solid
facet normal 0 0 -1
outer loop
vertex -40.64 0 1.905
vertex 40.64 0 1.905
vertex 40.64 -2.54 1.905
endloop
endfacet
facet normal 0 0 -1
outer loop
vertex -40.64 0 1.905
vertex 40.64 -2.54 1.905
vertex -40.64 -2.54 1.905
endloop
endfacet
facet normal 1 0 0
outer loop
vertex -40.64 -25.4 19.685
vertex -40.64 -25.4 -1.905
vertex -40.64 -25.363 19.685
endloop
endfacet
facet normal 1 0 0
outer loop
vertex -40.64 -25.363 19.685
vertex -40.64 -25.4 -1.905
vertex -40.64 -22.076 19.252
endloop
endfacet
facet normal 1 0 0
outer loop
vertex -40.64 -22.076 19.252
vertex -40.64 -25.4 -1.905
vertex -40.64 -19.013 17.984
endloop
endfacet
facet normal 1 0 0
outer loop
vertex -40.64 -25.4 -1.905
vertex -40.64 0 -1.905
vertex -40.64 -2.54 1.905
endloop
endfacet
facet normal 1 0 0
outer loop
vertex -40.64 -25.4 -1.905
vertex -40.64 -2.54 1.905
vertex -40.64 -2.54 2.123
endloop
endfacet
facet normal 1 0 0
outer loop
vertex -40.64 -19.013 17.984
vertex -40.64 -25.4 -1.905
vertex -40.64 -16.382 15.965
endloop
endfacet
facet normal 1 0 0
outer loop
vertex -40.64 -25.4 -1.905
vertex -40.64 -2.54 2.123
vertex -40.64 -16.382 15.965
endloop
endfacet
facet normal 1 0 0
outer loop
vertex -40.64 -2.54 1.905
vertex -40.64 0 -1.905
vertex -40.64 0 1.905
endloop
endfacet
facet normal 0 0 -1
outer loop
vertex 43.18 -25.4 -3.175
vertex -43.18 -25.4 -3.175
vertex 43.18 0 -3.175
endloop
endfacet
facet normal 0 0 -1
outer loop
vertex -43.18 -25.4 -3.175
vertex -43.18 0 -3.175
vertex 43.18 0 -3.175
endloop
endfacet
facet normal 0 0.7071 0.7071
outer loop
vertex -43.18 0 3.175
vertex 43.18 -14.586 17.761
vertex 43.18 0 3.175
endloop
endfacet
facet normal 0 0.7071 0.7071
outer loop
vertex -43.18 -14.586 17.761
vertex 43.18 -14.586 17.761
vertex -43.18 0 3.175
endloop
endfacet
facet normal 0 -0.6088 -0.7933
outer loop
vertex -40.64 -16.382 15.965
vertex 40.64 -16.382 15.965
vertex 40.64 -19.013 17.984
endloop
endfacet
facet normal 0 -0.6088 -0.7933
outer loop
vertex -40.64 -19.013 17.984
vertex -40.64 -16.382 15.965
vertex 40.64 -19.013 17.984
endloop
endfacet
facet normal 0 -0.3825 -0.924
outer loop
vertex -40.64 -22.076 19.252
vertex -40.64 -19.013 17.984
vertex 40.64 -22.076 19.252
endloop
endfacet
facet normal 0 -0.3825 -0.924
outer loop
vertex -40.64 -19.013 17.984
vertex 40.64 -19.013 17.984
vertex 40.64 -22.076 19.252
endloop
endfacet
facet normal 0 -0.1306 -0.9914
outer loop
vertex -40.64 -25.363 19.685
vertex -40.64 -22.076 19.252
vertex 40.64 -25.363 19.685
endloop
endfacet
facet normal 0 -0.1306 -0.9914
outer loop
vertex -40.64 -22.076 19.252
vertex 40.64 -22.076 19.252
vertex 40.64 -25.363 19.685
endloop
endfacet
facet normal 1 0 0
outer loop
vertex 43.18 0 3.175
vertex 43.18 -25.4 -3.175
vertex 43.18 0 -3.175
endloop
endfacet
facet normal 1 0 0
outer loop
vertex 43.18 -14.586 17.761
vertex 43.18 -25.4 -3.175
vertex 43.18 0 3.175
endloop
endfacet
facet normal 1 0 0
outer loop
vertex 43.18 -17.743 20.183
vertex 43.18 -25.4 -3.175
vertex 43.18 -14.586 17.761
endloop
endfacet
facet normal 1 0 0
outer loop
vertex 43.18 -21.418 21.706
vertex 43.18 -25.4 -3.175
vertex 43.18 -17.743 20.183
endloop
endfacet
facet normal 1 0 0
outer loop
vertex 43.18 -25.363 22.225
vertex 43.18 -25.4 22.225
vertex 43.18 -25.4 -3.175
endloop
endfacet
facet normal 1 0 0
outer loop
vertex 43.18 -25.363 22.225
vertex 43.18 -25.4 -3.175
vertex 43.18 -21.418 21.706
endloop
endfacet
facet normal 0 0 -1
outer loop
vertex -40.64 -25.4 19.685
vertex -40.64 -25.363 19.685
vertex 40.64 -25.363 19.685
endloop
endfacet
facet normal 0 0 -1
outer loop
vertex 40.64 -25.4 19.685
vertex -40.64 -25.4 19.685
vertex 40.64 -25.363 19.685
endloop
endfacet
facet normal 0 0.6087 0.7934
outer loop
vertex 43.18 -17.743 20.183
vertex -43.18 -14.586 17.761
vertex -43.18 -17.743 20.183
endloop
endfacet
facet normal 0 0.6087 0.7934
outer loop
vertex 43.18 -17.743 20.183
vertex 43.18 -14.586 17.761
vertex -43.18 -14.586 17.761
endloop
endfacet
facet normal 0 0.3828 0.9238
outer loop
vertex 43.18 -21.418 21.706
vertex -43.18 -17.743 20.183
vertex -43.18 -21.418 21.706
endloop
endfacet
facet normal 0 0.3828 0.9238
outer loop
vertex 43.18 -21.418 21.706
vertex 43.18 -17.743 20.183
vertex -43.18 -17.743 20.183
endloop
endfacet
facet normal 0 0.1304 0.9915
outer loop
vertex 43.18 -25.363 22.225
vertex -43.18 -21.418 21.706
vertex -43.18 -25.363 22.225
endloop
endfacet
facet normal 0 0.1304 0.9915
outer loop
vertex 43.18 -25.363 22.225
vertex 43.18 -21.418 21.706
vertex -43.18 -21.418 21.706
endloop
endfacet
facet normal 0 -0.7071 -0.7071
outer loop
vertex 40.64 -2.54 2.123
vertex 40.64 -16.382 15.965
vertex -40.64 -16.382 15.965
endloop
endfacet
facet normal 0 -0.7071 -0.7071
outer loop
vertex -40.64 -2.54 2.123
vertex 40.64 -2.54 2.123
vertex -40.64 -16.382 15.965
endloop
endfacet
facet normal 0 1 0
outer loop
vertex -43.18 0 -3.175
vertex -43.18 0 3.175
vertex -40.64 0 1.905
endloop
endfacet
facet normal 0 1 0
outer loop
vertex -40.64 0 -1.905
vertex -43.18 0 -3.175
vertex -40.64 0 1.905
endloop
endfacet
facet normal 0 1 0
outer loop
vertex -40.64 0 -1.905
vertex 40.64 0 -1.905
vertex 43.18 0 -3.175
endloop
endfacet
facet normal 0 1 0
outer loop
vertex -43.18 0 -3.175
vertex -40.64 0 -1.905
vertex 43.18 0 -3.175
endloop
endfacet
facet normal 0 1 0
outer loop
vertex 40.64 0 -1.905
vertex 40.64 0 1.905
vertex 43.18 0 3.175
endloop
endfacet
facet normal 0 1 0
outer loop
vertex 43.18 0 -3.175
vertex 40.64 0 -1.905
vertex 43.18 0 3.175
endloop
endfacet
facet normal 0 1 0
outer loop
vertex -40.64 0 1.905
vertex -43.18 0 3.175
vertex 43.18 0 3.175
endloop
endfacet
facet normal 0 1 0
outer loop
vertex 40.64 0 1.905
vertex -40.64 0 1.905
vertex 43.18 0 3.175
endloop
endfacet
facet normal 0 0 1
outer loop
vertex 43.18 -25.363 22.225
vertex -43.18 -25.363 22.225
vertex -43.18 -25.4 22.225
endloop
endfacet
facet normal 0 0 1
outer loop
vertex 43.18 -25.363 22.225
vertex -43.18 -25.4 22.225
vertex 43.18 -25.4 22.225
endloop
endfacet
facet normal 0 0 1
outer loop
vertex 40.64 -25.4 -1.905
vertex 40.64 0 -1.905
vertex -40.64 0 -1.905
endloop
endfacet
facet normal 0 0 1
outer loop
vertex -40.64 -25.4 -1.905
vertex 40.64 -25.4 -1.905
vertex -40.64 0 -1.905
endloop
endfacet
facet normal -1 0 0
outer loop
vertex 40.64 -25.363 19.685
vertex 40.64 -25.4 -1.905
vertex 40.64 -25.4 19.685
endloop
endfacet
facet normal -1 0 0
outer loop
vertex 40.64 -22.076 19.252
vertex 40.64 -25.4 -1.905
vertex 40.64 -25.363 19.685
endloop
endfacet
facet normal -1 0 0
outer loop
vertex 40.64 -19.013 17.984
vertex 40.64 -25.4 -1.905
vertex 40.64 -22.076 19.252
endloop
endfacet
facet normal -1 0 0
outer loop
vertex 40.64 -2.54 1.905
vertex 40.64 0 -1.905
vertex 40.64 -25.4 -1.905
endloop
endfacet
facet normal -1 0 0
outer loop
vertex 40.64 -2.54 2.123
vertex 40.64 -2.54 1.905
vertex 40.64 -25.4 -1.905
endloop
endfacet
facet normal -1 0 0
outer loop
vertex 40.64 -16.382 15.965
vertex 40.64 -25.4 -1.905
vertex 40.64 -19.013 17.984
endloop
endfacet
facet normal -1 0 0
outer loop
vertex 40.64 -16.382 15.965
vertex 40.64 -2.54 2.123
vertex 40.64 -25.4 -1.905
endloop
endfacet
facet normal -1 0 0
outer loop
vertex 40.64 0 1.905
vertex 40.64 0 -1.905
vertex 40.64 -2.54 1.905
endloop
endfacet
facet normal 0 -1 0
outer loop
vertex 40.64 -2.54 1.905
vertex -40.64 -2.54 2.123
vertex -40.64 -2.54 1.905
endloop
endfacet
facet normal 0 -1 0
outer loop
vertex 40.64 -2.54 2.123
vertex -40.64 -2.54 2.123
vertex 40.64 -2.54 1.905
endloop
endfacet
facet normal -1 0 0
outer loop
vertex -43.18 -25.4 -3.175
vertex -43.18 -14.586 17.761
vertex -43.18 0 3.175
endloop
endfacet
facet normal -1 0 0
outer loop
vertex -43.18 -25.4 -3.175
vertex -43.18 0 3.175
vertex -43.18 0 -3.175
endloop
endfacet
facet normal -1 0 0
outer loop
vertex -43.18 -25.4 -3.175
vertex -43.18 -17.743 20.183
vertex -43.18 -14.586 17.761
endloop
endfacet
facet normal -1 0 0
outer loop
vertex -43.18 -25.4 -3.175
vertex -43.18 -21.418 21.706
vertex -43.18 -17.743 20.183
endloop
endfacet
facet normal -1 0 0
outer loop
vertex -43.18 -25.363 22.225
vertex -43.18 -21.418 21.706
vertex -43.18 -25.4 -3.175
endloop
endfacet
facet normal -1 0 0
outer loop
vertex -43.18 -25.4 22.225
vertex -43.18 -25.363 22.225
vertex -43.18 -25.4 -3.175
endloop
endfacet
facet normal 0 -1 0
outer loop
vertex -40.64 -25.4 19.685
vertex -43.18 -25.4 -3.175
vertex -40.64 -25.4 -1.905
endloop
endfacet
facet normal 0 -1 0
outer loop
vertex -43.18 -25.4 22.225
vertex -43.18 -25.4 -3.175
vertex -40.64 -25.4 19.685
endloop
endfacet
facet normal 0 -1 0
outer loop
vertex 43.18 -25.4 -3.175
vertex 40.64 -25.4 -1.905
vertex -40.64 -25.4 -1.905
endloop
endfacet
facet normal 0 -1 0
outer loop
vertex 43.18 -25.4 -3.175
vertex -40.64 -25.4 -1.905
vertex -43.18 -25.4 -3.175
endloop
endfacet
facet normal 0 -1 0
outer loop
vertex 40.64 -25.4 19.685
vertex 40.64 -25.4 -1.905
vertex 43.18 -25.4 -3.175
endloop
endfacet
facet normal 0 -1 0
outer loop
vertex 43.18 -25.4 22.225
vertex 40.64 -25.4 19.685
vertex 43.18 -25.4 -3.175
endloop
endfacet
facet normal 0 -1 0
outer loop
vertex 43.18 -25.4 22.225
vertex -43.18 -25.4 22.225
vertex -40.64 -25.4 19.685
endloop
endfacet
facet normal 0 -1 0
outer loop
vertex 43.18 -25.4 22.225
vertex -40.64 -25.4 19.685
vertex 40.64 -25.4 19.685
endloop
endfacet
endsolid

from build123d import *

# Parameters (mm, degrees)
F0_W       = 86.36
F0_H       = 6.35
F1_DEPTH   = 19.05
F2_W       = 86.36
F2_H       = 19.05
F2_H_2     = 6.35
F3_DEPTH   = 6.35
F1_FACE1_W = 86.36
F1_FACE1_H = 19.05
F3_FACE_W  = 86.36
F3_FACE_H  = 6.35
F5_R       = 15.24
F6_T       = -2.54
F7_W       = 81.28
F7_H       = 3.81
F8_DEPTH   = 25.4010001


with BuildPart() as f1:
    # F0 (on Front) → F1 (new body)
    with BuildSketch(Plane.XZ):
        Rectangle(F0_W, F0_H)
    extrude(amount=F1_DEPTH)

    # F2 (on face) → F3 (join)
    with BuildSketch(Plane.XZ.offset(19.05)):
        with Locations((0, 12.7)):
            Rectangle(F2_W, F2_H)
        Rectangle(F2_W, F2_H_2)
    extrude(amount=F3_DEPTH)

    # F1_face1 (on face) → F4 section 0
    with BuildSketch(Plane(origin=(0, -9.525, 3.175), x_dir=(1, 0, 0), z_dir=(0, 0, 1))):
        Rectangle(F1_FACE1_W, F1_FACE1_H)
    # F3_face (on face) → F4 section 1
    with BuildSketch(Plane(origin=(0, -22.225, 22.225), x_dir=(1, 0, 0), z_dir=(0, 0, 1))):
        Rectangle(F3_FACE_W, F3_FACE_H)
    loft()

    # F5
    f5_edges = [f1.edges().sort_by_distance(p)[0] for p in [
        (0, -19.05, 22.225),
    ]]
    fillet(f5_edges, radius=F5_R)

    # F6
    f6_openings = [f1.faces().sort_by_distance(p)[0] for p in [
        (0, -25.4, 9.525),
    ]]
    offset(amount=F6_T, openings=f6_openings)

    # F7 (on face) → F8 (cut, through all)
    with BuildSketch(Plane(origin=(0, 0, 0), x_dir=(-1, 0, 0), z_dir=(0, 1, 0))):
        Rectangle(F7_W, F7_H)
    extrude(amount=-F8_DEPTH, mode=Mode.SUBTRACT)


solid = f1.part
